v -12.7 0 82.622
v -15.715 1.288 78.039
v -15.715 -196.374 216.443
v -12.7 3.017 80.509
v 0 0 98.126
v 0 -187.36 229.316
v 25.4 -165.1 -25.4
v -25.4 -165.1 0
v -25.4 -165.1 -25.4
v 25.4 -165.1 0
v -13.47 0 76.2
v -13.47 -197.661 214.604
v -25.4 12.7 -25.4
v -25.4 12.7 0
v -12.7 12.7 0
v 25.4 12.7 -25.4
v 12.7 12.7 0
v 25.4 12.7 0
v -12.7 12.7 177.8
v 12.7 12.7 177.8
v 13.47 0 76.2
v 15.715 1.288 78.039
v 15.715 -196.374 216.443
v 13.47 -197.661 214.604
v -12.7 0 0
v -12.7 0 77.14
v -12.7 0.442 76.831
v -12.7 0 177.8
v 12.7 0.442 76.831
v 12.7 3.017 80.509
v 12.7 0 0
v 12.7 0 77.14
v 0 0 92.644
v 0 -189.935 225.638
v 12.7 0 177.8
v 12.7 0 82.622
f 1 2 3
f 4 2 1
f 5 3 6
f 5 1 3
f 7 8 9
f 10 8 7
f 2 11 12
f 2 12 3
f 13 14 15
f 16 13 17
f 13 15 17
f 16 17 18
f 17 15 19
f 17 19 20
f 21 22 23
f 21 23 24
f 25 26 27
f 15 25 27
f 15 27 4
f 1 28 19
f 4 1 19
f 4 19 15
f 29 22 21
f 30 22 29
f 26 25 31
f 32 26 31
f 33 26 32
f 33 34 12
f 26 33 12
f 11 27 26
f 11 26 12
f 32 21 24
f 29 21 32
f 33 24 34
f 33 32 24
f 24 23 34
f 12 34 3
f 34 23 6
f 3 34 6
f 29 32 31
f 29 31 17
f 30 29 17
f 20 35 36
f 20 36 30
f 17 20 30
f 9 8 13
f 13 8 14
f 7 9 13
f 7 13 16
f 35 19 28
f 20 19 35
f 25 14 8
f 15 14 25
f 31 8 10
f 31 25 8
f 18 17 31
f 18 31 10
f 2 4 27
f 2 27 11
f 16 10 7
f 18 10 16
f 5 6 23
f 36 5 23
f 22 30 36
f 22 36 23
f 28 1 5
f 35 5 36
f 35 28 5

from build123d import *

# Parameters (mm, degrees)
F0_W     = 50.8
F0_H     = 177.8
F1_DEPTH = 25.4
F3_W     = 25.4
F3_H     = 12.7
F4_DEPTH = 101.6
F8_DEPTH = 241.3


with BuildPart() as f1:
    # F0 (on Top) → F1 (new body)
    with BuildSketch(Plane.XY):
        with Locations((0, -76.2)):
            Rectangle(F0_W, F0_H)
    extrude(amount=-F1_DEPTH)

    # F3 (on offset) → F4 (join, symmetric)
    with BuildSketch(Plane.XY.offset(76.2)):
        with Locations((0, 6.35)):
            Rectangle(F3_W, F3_H)
    extrude(amount=F4_DEPTH, both=True)

    # F7 (on face) → F8 (join)
    with BuildSketch(Plane(origin=(0, -35.802289, 25.069033), x_dir=(-1, 0, 0), z_dir=(0, 0.819152, -0.573576))):
        Polygon((-13.470384, 62.419386), (0, 75.88977), (13.470384, 62.419386), (15.715448, 64.66445), (0, 80.379898), (-15.715448, 64.66445), align=None)
    extrude(amount=-F8_DEPTH)


solid = f1.part
